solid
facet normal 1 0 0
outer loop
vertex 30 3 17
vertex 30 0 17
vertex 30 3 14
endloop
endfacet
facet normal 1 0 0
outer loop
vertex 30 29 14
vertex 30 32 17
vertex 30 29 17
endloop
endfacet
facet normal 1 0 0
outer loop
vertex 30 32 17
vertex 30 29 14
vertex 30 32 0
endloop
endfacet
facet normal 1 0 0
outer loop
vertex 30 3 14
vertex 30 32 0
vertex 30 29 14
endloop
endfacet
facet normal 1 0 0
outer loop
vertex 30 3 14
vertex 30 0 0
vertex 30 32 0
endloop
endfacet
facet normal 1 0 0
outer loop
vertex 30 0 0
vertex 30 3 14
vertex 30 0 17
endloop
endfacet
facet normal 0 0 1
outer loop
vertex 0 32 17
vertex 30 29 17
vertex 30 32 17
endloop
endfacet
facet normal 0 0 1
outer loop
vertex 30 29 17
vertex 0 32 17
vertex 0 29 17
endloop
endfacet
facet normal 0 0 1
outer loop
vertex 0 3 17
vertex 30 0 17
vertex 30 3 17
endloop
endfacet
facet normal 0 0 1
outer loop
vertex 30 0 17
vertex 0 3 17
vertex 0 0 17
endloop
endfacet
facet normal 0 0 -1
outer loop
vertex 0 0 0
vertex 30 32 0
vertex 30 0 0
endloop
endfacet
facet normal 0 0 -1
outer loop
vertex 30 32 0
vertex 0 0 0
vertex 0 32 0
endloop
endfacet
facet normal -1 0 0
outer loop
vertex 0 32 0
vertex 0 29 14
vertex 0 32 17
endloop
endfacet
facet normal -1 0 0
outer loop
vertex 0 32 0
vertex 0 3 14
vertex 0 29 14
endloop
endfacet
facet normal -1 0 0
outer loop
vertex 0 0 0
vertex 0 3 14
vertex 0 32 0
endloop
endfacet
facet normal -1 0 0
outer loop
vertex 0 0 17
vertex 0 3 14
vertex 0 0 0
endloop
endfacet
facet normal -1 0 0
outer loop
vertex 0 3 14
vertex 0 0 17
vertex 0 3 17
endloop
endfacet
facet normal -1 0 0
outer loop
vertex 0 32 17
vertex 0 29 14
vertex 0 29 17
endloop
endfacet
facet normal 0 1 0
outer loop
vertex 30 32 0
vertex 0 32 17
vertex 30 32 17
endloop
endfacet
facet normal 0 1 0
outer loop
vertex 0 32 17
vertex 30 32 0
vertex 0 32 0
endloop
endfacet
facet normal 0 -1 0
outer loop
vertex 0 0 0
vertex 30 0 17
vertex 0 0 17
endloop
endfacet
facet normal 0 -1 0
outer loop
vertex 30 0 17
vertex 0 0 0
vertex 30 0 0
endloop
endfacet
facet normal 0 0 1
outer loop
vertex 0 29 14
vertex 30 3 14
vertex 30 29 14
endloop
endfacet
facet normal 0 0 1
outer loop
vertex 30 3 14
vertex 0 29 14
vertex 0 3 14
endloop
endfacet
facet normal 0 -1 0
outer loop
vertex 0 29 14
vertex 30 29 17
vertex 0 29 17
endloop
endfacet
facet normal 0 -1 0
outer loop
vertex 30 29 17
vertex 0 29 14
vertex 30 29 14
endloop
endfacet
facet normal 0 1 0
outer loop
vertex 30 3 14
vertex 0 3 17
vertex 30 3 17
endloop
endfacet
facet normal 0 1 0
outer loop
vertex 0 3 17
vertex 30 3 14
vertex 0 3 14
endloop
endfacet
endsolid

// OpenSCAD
difference(){
cube([30,32,17,]);
translate([-1,3,14])cube([32,26,14,]);}
